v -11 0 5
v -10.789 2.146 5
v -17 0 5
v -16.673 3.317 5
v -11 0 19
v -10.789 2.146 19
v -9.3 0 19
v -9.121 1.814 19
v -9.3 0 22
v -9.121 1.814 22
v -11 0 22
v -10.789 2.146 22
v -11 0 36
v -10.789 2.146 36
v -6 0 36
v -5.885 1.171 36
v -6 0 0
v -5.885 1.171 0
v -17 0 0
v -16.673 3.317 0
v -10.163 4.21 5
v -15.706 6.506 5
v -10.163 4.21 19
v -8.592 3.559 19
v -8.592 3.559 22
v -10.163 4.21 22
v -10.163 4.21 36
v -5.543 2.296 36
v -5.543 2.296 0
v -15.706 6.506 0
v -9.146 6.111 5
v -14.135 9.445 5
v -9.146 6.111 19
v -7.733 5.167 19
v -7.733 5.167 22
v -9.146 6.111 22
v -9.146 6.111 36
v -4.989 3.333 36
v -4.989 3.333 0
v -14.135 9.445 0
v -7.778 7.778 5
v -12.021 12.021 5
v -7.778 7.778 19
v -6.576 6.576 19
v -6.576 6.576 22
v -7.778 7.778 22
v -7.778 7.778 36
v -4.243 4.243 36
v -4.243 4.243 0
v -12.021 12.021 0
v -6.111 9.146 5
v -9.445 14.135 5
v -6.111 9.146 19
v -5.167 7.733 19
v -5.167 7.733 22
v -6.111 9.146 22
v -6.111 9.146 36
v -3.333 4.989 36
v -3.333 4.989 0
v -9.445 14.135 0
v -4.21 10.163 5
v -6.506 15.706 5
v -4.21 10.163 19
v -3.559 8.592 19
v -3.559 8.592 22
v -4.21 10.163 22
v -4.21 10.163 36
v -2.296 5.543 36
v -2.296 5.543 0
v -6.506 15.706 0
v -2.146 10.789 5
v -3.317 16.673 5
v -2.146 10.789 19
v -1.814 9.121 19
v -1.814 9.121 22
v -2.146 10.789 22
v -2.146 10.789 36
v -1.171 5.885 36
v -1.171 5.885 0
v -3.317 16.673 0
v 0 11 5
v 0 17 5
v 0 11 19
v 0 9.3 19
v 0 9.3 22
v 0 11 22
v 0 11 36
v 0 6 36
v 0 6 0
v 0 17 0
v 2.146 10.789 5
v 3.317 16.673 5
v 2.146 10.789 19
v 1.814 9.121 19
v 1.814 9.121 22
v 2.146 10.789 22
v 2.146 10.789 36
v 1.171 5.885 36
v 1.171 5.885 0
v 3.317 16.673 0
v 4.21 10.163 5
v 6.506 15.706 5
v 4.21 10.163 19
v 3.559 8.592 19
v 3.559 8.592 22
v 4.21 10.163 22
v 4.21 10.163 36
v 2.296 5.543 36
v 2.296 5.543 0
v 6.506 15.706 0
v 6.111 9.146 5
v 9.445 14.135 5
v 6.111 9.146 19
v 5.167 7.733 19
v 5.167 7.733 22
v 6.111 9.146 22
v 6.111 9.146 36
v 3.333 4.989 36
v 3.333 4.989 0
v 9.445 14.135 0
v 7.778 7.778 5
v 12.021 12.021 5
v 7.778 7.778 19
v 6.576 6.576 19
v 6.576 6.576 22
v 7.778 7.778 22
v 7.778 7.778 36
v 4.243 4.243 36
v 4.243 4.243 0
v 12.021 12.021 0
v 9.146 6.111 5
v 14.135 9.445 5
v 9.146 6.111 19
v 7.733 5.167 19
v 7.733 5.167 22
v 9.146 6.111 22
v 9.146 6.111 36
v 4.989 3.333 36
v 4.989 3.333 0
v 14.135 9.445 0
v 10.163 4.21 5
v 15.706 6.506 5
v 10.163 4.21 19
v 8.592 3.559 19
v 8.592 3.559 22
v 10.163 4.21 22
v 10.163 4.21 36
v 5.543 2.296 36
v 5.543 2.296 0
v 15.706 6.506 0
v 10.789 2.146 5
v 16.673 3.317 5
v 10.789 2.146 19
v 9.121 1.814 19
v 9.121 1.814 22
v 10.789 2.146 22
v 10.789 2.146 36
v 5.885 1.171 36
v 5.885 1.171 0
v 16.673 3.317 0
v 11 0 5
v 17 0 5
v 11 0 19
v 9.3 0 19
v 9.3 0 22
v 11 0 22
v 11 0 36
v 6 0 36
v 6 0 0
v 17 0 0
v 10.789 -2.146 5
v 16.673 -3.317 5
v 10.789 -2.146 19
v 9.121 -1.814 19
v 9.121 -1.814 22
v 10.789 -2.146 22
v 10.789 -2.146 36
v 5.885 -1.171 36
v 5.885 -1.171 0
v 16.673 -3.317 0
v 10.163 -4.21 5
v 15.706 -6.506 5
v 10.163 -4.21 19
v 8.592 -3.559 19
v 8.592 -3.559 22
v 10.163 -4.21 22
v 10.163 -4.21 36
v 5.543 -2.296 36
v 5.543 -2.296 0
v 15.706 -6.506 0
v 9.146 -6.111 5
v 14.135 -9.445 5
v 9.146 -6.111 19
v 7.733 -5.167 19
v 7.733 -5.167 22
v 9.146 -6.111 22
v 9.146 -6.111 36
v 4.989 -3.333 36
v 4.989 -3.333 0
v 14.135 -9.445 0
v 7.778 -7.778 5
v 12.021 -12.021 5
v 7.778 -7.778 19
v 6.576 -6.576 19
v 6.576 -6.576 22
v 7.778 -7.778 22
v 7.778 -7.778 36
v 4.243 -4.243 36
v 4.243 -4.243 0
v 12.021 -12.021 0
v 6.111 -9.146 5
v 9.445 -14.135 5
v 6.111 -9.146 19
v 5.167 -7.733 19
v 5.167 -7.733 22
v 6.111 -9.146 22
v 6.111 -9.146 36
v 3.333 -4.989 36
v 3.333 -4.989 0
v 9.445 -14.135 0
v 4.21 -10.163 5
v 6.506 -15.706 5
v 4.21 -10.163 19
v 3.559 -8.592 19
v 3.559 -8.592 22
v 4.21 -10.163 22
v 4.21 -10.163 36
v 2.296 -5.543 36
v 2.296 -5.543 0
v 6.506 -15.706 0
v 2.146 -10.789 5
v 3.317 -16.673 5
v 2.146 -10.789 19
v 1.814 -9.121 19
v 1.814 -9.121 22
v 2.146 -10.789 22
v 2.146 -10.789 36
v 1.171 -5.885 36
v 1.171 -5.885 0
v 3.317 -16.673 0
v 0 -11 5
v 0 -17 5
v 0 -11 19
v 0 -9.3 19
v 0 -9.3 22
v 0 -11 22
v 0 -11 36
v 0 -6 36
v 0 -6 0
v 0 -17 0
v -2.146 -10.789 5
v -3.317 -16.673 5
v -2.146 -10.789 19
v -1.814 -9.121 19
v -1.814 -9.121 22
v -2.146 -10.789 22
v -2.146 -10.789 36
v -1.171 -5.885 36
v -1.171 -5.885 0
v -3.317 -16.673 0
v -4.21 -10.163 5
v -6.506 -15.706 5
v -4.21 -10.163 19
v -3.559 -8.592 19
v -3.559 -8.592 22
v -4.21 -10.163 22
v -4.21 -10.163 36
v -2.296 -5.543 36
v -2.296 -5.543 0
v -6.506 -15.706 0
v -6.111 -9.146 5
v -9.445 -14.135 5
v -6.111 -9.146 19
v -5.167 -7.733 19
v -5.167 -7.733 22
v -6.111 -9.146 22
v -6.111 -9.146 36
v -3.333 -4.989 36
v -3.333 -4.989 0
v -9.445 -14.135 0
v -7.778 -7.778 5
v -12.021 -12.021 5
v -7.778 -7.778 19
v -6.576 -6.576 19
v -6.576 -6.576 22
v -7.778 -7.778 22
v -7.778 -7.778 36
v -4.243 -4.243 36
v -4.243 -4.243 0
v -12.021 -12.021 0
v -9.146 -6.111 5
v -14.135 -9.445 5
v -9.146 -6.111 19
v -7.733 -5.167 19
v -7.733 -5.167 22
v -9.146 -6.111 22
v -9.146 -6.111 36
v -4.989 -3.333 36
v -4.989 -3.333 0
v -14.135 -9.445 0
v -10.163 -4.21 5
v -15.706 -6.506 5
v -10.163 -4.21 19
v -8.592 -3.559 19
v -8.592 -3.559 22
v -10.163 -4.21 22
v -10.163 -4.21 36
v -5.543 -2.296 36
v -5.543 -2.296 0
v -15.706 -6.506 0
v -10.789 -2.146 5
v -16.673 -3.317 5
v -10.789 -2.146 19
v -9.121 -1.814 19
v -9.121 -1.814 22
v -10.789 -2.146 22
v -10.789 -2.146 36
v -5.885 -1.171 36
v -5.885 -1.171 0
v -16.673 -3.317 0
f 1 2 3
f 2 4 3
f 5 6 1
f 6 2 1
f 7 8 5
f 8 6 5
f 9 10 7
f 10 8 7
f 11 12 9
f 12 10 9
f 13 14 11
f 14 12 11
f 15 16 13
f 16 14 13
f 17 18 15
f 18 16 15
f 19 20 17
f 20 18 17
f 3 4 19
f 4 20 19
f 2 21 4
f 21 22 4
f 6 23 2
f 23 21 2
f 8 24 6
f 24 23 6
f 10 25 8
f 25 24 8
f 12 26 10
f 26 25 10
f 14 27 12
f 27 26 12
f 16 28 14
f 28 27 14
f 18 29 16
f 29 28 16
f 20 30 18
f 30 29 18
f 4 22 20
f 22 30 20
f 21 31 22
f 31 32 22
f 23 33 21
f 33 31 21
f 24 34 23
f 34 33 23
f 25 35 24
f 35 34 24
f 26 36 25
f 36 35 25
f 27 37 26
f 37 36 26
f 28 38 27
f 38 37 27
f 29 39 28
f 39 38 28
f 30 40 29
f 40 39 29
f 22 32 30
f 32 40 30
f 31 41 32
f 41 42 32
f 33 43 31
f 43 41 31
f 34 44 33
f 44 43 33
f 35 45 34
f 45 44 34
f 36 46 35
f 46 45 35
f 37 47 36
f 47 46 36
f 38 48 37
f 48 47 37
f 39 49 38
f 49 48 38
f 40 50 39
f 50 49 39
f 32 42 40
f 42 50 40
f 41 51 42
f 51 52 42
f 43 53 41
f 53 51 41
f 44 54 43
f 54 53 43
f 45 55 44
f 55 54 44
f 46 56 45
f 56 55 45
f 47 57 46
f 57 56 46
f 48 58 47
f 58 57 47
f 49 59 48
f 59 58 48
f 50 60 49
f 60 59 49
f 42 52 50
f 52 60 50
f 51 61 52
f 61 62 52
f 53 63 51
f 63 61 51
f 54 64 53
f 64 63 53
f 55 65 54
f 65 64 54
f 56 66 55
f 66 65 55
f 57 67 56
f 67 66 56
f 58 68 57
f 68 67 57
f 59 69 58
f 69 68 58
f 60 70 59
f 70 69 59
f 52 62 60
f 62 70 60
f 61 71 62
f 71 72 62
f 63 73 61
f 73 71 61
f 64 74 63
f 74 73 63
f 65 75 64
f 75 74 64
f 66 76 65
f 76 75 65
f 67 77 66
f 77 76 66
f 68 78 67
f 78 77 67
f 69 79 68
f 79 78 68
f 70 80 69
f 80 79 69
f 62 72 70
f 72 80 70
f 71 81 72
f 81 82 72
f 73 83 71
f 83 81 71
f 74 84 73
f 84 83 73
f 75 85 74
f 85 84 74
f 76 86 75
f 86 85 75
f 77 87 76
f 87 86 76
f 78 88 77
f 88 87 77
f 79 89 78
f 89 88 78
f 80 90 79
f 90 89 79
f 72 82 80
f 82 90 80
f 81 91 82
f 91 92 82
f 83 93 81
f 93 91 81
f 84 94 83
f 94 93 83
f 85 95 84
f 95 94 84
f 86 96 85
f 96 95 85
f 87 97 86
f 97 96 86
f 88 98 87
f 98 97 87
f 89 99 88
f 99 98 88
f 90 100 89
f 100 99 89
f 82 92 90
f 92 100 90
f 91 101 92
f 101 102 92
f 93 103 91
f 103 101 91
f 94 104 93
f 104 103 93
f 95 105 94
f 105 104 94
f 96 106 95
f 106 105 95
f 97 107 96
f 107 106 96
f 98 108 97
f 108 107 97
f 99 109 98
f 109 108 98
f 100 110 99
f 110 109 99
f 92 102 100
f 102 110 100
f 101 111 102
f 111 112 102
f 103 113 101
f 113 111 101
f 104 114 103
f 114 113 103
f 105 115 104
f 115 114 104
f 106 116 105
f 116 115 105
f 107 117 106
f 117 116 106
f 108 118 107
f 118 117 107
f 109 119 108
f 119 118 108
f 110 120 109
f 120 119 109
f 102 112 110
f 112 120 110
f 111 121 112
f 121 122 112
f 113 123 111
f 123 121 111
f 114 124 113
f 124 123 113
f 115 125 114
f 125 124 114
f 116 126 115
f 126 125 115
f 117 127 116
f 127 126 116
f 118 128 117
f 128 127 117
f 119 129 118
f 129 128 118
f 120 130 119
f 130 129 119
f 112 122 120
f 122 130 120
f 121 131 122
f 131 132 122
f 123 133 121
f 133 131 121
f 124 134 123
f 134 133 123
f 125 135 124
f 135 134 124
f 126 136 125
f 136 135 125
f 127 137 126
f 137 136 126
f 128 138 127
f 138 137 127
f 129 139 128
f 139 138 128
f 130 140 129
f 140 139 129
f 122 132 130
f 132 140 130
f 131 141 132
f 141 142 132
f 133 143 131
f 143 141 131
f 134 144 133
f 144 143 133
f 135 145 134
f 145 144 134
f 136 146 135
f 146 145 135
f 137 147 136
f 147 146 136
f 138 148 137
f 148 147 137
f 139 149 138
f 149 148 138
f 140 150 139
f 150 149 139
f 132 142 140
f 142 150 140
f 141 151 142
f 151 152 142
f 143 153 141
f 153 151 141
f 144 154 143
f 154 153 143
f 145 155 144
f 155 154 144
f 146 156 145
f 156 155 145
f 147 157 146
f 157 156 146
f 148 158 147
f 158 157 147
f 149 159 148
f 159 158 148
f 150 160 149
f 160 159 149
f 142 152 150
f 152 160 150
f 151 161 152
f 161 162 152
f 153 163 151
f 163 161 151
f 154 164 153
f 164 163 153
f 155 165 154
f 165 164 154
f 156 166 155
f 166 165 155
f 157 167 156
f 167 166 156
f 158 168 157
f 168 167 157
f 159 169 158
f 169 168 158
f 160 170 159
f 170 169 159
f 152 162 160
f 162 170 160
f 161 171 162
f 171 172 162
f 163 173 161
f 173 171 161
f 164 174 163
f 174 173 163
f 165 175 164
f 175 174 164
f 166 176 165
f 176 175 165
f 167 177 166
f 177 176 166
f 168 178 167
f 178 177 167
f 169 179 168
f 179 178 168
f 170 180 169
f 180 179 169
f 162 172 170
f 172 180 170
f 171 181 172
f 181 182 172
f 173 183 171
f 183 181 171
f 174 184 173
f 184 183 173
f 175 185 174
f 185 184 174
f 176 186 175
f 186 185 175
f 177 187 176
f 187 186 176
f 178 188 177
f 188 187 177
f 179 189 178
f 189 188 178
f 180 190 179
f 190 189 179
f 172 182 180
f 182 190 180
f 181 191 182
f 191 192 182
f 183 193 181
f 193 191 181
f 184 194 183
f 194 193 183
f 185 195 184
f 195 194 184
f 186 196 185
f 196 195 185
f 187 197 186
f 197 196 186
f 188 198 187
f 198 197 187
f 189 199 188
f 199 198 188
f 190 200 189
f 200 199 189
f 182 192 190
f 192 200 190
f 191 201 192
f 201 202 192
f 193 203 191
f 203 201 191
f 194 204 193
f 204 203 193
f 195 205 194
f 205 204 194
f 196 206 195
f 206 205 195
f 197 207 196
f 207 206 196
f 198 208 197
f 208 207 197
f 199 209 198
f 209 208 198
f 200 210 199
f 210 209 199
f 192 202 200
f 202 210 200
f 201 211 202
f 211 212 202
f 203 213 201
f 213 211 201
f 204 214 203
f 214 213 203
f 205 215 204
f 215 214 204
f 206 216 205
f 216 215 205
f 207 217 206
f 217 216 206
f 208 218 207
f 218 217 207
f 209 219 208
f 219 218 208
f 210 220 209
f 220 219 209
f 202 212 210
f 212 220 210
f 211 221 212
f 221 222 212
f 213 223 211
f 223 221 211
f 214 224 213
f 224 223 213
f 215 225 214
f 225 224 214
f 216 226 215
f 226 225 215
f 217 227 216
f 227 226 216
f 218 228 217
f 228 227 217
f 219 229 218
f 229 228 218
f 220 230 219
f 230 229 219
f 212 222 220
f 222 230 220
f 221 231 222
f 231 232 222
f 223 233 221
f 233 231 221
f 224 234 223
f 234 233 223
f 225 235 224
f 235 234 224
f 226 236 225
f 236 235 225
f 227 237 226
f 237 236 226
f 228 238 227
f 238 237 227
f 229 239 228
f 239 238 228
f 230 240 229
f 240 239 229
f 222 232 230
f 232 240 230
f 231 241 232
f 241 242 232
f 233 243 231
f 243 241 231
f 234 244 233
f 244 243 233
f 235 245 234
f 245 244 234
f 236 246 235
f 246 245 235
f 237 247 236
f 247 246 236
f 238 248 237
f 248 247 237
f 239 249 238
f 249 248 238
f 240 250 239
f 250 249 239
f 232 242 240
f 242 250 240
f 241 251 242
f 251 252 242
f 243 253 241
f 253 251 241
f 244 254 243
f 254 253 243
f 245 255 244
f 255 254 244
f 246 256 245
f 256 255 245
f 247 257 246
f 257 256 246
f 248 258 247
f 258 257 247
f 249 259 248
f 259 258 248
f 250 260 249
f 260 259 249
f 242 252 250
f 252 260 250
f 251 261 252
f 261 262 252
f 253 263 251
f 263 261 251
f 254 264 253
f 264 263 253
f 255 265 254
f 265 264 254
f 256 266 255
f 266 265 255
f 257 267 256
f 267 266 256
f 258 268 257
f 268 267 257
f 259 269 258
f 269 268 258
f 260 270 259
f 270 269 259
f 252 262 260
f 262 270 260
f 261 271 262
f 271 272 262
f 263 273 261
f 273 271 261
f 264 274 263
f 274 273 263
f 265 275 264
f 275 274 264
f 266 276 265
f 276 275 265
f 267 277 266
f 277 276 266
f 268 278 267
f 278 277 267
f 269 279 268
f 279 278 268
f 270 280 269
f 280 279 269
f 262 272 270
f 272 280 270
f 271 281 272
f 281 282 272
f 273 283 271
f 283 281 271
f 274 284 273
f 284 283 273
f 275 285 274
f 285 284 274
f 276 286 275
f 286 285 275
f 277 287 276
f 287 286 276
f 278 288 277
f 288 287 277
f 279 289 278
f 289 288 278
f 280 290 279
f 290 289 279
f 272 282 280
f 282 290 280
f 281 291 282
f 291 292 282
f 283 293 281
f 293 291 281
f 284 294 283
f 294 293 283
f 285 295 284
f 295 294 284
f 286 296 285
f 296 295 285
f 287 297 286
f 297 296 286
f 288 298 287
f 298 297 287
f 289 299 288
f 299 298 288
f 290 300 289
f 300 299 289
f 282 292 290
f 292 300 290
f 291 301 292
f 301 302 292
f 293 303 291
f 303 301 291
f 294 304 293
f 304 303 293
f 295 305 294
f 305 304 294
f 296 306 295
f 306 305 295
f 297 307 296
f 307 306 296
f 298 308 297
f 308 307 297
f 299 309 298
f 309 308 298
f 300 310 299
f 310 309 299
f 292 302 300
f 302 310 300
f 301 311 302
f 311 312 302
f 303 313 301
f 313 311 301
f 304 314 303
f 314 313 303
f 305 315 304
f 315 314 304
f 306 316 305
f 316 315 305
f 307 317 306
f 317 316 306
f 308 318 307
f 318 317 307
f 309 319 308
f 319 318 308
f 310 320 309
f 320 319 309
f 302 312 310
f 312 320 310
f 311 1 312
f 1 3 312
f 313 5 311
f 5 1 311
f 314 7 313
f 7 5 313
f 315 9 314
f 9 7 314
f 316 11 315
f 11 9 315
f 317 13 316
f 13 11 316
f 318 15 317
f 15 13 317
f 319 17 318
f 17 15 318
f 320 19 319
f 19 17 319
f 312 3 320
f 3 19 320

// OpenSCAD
$fn = 32;

// ----------------------------------------------------------------------
// Grooved revolve: flanged, bore R6
// ----------------------------------------------------------------------

// --- parameters (mm) ---
bore_r = 6;               // bore radius
outer_r = 11;             // outer radius of the body
total_h = 36;             // overall height, Z
wall = 5;                 // radial wall thickness
groove_w = 3;             // groove width
groove_d = 1.7;           // groove depth
grooves = 1;              // number of outer grooves
flange_r = 17;            // flange radius
flange_h = 5;             // flange height

bbox_x = 2 * flange_r;  // full diameter
bore_d = 2 * bore_r;  // bore diameter
body_d = 2 * outer_r;  // body diameter
flange_d = 2 * flange_r;  // flange diameter
revolve_angle = 360;  // full turn around the Z axis

profile = [[6, 0], [11, 0], [17, 0], [17, 5], [11, 5], [11, 19], [9.3, 19], [9.3, 22], [11, 22], [11, 36], [6, 36]];  // primary outline, 11 points, counter clockwise

// --- the one profile operation ---
rotate_extrude(angle = revolve_angle) polygon(points = profile);
